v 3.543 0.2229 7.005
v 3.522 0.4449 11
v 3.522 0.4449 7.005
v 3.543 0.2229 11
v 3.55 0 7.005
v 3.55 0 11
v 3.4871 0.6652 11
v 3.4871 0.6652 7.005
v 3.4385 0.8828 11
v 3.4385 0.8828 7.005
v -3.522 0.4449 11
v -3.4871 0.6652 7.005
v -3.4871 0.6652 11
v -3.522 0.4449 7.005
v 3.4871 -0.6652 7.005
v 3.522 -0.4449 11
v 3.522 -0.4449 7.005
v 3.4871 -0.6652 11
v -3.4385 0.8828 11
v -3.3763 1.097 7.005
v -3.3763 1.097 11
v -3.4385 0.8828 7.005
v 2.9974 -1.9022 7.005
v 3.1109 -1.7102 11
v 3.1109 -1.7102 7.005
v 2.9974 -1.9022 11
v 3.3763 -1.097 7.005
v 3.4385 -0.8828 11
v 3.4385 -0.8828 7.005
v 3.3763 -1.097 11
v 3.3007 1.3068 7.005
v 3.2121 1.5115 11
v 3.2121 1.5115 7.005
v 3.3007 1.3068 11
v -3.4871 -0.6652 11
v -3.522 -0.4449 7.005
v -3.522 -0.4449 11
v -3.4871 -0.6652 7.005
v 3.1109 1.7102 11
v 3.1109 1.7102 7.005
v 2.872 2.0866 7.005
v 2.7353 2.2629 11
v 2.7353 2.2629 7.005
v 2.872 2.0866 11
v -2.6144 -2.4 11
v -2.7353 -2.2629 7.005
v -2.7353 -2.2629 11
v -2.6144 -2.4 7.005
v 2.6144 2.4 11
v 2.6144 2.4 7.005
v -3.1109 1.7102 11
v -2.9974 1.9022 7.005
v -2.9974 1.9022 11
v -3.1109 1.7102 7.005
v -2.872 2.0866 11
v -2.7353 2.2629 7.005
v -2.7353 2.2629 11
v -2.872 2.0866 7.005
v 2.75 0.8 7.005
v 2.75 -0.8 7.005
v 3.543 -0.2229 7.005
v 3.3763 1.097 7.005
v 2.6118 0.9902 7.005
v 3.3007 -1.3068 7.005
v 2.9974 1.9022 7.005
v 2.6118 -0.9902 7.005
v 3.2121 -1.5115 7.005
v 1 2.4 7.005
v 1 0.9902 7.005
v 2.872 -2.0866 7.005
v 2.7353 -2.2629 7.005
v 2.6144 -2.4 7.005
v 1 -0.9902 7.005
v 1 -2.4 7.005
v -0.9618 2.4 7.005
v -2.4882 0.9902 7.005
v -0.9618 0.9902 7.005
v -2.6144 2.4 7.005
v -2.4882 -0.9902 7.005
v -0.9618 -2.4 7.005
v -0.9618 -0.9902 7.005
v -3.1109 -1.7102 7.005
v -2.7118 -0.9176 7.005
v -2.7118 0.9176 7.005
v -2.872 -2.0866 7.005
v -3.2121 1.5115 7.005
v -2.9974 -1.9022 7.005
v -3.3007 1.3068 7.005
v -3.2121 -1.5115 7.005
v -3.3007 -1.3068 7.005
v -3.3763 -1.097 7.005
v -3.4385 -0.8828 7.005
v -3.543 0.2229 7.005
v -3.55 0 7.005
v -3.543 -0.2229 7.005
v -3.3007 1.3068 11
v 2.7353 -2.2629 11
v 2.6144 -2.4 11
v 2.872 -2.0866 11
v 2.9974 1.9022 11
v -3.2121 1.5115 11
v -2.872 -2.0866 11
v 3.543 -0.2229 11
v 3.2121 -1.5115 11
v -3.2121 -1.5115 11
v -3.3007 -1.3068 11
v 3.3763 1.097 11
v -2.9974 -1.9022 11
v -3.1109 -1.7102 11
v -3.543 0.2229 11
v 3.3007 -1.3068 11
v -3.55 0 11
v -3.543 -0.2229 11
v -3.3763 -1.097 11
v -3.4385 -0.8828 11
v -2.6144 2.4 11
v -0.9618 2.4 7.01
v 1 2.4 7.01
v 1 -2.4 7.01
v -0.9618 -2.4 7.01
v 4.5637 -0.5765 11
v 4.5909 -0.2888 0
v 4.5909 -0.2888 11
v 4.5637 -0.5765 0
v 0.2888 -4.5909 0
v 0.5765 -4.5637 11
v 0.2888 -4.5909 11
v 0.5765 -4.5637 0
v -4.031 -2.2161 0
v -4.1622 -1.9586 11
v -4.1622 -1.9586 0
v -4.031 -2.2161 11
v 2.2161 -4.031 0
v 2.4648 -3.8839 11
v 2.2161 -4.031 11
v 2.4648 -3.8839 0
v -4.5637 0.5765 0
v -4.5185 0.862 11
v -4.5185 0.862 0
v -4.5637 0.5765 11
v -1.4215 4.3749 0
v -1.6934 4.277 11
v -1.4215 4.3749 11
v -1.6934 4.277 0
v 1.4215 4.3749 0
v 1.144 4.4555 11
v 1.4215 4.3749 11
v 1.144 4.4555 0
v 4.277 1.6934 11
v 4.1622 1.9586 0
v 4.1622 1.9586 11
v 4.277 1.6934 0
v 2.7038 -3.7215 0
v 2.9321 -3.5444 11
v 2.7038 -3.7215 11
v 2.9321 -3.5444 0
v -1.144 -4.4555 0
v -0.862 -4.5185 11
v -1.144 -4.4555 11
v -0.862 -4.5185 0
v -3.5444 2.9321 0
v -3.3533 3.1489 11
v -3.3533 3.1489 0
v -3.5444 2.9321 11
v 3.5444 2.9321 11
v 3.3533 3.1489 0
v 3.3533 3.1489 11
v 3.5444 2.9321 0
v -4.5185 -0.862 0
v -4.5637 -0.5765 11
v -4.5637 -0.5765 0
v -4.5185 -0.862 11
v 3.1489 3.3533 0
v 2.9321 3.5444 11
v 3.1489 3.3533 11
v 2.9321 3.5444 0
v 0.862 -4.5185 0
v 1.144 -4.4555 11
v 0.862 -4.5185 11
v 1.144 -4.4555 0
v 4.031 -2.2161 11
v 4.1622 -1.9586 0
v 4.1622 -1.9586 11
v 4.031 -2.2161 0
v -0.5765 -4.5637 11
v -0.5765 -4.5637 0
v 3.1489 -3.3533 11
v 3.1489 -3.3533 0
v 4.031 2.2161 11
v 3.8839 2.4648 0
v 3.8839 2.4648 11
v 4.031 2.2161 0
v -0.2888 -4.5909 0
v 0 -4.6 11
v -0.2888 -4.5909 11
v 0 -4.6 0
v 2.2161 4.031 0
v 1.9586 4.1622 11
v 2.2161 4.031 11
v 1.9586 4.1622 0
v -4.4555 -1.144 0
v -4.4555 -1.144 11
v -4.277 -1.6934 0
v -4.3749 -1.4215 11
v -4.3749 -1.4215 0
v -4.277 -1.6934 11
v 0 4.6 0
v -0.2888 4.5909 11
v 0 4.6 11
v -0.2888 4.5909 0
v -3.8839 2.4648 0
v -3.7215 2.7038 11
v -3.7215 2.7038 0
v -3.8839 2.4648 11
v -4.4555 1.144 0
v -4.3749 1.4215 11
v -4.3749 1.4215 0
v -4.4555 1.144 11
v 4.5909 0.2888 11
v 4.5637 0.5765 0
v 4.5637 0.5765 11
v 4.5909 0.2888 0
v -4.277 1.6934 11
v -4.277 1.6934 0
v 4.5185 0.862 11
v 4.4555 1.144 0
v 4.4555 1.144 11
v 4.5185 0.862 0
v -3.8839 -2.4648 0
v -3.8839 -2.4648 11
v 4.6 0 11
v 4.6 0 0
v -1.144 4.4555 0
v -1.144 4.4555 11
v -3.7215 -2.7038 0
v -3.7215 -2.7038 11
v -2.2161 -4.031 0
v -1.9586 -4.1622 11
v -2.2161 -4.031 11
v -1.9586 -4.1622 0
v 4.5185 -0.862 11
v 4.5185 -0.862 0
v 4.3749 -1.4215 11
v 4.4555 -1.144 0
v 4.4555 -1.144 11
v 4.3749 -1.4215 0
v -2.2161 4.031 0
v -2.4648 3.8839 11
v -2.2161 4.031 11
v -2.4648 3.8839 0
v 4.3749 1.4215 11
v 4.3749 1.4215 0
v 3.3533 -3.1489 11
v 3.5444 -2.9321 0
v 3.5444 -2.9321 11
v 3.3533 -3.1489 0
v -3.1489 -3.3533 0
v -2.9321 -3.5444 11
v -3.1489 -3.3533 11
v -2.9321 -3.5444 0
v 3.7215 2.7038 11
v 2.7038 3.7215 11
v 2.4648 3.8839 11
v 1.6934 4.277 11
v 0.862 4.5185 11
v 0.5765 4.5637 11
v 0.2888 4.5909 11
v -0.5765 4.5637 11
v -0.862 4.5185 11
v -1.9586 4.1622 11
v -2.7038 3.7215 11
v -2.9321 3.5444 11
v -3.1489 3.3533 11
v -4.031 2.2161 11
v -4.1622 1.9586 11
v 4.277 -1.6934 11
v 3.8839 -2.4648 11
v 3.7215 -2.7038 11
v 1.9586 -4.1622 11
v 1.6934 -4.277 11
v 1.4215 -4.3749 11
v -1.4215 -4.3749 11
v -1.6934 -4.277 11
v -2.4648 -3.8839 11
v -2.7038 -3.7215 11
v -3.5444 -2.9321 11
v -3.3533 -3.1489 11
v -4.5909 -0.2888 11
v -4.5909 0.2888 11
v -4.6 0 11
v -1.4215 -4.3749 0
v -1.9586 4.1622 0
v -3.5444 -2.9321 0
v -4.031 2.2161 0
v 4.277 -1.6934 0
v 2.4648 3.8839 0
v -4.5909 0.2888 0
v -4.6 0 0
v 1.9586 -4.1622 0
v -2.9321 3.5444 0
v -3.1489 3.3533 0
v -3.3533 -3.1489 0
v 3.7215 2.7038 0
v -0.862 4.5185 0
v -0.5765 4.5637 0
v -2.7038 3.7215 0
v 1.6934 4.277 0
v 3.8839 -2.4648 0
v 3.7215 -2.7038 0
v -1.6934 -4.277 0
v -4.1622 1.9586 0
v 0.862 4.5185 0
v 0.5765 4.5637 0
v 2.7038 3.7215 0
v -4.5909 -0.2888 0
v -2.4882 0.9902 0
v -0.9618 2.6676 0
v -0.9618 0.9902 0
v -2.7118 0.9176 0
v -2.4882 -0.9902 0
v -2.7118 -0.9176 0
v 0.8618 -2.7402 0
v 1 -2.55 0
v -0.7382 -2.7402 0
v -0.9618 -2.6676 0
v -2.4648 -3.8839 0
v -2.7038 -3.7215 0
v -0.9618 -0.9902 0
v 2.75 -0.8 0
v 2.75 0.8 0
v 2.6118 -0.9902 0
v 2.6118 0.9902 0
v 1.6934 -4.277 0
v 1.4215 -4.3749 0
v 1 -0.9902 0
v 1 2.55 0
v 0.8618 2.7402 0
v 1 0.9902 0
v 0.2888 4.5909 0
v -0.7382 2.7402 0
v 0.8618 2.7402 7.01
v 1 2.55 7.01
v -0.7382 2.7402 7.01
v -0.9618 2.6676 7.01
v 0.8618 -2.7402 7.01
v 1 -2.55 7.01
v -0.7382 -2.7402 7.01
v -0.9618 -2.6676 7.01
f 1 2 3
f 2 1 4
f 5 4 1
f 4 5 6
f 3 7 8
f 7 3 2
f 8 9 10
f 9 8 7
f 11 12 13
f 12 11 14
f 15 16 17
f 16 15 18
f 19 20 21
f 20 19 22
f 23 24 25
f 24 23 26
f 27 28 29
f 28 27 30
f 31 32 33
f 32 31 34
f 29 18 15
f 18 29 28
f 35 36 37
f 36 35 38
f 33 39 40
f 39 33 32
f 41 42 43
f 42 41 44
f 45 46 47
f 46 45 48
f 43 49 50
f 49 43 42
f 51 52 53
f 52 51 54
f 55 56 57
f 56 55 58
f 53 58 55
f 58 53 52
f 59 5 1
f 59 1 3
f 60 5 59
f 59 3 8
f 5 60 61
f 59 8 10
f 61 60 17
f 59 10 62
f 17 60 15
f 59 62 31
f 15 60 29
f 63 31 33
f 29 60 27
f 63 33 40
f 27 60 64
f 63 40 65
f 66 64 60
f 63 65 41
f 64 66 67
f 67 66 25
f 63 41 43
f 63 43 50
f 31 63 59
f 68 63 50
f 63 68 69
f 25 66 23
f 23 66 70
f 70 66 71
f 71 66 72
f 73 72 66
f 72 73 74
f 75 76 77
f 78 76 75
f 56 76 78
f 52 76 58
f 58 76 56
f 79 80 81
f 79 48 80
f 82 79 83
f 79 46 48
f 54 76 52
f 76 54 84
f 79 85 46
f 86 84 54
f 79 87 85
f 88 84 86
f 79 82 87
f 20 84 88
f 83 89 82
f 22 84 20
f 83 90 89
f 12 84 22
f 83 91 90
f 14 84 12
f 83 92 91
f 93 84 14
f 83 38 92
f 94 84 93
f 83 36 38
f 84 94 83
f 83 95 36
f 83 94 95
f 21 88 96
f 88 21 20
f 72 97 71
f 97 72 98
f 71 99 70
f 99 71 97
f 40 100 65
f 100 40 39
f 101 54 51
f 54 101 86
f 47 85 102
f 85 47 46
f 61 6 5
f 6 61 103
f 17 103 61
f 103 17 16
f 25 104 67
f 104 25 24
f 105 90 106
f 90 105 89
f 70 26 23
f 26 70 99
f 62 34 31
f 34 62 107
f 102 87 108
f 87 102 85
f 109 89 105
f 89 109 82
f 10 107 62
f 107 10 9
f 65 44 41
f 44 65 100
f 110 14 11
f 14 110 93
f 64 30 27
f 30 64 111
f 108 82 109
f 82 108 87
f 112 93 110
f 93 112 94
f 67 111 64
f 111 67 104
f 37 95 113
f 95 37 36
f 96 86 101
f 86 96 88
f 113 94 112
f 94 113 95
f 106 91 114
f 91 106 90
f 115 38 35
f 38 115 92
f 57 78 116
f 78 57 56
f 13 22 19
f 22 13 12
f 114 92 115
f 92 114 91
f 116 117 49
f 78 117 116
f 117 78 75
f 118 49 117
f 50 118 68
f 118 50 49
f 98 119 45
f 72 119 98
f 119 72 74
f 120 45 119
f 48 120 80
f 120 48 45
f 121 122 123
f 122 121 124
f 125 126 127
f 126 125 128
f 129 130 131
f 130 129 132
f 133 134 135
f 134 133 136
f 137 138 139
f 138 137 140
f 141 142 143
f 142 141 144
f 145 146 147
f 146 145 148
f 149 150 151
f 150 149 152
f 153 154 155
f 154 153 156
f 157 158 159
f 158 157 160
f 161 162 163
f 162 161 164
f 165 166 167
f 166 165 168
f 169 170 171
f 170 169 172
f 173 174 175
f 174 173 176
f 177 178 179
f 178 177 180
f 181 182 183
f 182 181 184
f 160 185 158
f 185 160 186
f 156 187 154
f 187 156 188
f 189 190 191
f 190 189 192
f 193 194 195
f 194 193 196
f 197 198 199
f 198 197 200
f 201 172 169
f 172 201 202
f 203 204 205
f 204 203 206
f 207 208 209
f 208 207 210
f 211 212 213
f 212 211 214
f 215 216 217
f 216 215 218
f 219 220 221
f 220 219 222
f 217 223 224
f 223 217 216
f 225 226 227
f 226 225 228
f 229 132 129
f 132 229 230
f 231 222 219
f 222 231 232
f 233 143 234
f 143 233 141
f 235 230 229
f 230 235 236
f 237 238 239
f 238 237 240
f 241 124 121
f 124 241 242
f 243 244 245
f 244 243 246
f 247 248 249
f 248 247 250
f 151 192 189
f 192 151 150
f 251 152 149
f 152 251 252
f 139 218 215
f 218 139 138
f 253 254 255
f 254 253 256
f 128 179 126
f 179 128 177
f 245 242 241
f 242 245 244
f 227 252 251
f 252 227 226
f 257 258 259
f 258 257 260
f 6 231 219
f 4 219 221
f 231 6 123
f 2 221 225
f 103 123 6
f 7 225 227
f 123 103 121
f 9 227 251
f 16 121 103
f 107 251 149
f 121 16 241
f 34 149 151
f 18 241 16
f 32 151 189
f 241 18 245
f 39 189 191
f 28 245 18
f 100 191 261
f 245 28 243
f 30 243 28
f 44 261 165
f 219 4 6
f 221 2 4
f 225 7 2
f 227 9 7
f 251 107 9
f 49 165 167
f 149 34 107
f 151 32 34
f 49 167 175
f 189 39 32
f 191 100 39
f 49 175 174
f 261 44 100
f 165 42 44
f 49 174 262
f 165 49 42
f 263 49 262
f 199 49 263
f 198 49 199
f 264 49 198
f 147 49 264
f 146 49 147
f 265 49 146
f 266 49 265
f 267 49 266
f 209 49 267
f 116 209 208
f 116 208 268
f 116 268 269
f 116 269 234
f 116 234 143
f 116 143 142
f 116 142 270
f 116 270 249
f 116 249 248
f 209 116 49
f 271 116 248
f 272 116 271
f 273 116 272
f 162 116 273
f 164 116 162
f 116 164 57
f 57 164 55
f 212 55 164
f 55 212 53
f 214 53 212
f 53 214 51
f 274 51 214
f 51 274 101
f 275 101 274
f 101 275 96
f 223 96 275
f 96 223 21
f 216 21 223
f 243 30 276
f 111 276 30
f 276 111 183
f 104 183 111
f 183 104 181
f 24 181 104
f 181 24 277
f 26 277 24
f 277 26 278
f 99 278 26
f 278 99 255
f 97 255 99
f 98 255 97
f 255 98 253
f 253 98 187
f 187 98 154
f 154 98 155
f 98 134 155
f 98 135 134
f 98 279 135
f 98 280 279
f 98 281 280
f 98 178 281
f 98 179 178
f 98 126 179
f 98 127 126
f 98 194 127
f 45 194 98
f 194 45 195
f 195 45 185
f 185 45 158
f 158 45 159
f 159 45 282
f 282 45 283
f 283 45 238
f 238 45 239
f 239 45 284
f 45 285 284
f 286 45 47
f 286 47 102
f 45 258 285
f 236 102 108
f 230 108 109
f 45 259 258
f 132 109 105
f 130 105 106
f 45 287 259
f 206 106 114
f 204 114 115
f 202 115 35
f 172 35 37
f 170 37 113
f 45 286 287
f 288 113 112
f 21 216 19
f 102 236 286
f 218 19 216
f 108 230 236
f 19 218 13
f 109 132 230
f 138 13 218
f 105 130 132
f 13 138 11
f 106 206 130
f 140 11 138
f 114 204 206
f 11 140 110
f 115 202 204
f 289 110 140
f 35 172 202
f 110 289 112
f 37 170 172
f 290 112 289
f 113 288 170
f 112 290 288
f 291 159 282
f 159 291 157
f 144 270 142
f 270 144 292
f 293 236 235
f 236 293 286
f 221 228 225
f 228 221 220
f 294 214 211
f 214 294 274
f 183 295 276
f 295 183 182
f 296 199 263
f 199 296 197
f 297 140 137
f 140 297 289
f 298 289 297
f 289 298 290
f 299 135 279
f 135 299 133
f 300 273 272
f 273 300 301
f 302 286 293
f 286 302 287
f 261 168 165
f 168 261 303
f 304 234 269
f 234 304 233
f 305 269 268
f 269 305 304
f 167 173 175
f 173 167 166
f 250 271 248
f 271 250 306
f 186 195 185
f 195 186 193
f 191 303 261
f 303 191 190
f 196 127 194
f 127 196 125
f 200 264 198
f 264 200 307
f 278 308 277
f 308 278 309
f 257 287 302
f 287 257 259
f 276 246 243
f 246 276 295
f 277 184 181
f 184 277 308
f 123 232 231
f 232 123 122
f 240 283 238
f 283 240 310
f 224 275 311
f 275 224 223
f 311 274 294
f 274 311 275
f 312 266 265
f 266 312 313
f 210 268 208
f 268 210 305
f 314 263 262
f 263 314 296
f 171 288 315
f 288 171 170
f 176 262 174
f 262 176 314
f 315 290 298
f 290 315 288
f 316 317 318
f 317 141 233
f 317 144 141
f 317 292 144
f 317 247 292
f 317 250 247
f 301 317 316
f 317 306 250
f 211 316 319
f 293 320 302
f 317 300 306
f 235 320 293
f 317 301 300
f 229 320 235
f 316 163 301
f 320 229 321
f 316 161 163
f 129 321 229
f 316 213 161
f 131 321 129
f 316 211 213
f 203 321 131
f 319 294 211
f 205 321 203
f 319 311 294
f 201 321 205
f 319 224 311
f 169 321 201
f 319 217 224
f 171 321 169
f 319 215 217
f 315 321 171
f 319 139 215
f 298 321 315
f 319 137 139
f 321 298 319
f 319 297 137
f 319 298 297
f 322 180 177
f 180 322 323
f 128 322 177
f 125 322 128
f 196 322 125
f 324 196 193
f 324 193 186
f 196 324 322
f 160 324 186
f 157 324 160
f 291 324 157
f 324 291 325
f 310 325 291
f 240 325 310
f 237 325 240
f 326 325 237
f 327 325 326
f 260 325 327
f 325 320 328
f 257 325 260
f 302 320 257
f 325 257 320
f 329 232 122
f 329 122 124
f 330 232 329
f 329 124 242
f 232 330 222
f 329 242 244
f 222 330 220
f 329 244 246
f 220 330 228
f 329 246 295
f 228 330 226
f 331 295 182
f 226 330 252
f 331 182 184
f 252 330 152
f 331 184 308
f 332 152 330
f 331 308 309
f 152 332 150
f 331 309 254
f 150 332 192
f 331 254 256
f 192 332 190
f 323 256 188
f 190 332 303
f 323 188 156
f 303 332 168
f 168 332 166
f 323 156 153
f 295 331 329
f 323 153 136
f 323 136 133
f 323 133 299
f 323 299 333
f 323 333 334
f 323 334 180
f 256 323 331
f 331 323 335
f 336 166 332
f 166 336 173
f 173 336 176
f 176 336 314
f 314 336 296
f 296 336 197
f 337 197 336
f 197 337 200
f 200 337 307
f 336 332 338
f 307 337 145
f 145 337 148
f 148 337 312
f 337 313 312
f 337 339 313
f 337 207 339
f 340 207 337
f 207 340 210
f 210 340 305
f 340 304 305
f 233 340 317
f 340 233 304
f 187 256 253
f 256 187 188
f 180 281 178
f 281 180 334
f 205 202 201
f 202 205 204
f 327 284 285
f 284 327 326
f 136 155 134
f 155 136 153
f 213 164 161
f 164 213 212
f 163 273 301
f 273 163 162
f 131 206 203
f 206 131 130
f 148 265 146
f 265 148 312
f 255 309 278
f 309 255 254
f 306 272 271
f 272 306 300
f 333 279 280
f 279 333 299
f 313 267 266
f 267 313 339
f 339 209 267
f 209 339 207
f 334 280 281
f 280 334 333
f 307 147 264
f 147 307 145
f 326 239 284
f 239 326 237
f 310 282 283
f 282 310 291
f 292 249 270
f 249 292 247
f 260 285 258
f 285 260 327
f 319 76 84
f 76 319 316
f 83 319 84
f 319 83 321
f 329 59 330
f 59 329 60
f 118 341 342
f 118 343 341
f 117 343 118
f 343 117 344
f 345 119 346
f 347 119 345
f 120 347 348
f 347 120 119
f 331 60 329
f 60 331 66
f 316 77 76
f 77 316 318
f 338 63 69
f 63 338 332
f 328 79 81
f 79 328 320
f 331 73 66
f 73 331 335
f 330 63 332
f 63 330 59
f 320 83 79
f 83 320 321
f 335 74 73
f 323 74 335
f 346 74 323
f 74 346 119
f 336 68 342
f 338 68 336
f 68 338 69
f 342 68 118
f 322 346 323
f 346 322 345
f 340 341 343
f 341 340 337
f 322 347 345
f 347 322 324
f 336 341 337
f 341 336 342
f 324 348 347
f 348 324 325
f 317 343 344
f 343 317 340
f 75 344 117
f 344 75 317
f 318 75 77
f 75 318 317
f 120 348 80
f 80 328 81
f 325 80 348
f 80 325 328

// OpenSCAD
// DC motor shaft to lego coupler
//
// Created by Moby Disk, 2015/02/08
// Thanks to mrob27 for thing 40410
// Changed by Drato to fit a Solarbotics GM8 Motor http://www.thingiverse.com/thing:1013155

// Diameters of various motor shafts:
// - Radio Shack 2730223: 2.0mm
// - Radio Shack 2730256: 2.3mm

// When 3D printing couplers, always try 0.1 - 0.3mm too big and test to see what actually fits

// Diameter of motor axle cutout, in mm, if motor axle is round without cutouts diameter is the same as motor_axle_diameter
motor_axle_cutout_diameter = 4.8;

// Diameter of motor axle, in mm
motor_axle_diameter = 7.1;

// Do you want to try some different axle sizes to see what fits best?
try_bigger_sizes = "no"; // [yes,no]

// Length of the axle part, in mm
axle_length = 7;
// Length of the motor axle part, in mm
motor_axle_length = 4;

// Outside radius of the coupler, in mm
coupler_outside_diameter = 9.2;

coupler_round_to_lego_axle(motor_axle_diameter,0, axle_length, motor_axle_length, coupler_outside_diameter);

spacing=coupler_outside_diameter*1.5;

if (try_bigger_sizes=="yes")
{
	for (bigger=[1:3])
	{
		translate([bigger*spacing,0,0])
		coupler_round_to_lego_axle(motor_axle_diameter,0.1*bigger, axle_length, motor_axle_length, coupler_outside_diameter);
	}
}

// Coupler for round DC motor shafts
// 
// diameter: diameter of the motor's axle
// fudge: Additional radius for the axle hole
//        - For 3D printing, the hole for the motor shaft must be larger than the actual axle itself
//        - 0.2mm and 0.3mm seem to work, but this may vary based on the printer and material
// length: A lego coupler is typically 15.9mm
// outside: outside diameter, increase for more strength
//
module coupler_round_to_lego_axle(diameter, fudge=0.2, axle_length=7, motor_axle_length=4, outside=7.2)
{
   // axle thickness is actually about 1.8 mm.  But for 3D printing, holes need to be bigger.
//   axle_gap = 1.9;
//   hole_radius = 2.65;
    axle_gap = 2;
	hole_radius = 2.75;
    
length = axle_length + motor_axle_length;
    
   motor_axle_diameter=diameter + fudge;
   difference()
   {
      // The coupler body
      translate([0,0,length/2])
      cylinder(r=outside/2,h=length,center=true,$fn=100);

      // The lego cross-axle hole
      translate([0 - hole_radius, 0 - axle_gap/2, -0.01])
      roundedRect([hole_radius * 2, axle_gap, axle_length+0.02], .2);
      translate([0 - axle_gap/2, 0 - hole_radius, -0.01])
      roundedRect([axle_gap, hole_radius * 2, axle_length+0.02], .2);

      difference()
      {
        // The hole for the motor shaft
        translate([0, 0, length-motor_axle_length/2+0.01])
        cylinder(r=motor_axle_diameter/2,h=motor_axle_length+0.01,center=true,$fn=100);
          
        translate([0,motor_axle_diameter/2+motor_axle_cutout_diameter/2, length-motor_axle_length/2+0.01])
        cube([motor_axle_diameter, motor_axle_diameter, motor_axle_length+0.01], true);
          
        translate([0,-motor_axle_diameter/2-motor_axle_cutout_diameter/2, length-motor_axle_length/2+0.01])
        cube([motor_axle_diameter, motor_axle_diameter, motor_axle_length+0.01], true);
      }
   }
}

// ---------------------------------------------------------------------------------
//
// module for rounded rectangles by tlrobinson on Thingiverse in a 
// comment posted to http://www.thingiverse.com/thing:9347 on March
// 29, 2012, 3:57:46 AM EDT
//
module roundedRect(size, radius) {  
  x = size[0];  
  y = size[1];  
  z = size[2];  
 
  linear_extrude(height=z)  
  hull() {  
    translate([radius, radius, 0])  
      circle(r=radius);  
 
    translate([x - radius, radius, 0])  
      circle(r=radius);  
 
    translate([x - radius, y - radius, 0])  
      circle(r=radius);  
 
    translate([radius, y - radius, 0])  
      circle(r=radius);  
  }  
}
